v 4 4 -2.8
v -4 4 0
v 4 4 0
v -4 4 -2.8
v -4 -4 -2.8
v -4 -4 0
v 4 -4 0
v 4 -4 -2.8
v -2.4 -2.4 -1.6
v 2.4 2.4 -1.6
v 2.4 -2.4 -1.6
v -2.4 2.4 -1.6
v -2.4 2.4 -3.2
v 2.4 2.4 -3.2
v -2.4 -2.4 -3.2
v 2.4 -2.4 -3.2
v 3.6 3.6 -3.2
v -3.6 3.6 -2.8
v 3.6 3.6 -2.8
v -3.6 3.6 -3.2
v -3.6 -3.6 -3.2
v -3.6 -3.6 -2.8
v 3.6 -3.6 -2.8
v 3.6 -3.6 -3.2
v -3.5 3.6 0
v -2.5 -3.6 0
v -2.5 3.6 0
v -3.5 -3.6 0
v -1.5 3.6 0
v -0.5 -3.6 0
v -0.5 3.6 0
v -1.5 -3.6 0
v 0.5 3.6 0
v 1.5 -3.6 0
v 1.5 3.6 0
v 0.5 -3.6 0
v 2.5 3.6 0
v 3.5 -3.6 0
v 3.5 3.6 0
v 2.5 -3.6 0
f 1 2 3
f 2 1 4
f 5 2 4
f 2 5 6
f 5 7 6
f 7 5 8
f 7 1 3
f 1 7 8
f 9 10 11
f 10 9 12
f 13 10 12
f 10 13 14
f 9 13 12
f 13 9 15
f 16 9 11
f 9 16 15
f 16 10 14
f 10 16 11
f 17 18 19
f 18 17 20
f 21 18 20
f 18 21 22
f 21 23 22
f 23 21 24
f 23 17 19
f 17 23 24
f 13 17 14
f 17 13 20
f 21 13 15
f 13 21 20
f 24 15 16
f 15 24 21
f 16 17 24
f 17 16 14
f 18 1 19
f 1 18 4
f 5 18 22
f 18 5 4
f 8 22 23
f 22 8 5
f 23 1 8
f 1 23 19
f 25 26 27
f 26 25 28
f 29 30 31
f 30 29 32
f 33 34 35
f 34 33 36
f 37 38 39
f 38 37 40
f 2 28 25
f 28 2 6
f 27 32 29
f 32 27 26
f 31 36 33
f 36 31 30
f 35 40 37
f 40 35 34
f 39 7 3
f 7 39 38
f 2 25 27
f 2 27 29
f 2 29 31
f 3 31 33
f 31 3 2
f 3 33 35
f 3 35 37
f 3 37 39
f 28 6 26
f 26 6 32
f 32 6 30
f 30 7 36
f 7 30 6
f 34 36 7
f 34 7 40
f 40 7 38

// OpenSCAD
// file: ../p/4-4edge.scad
use <../lib.scad>
$fa=1; $fs=0.2;
function ldraw_lib__4_4edge(realsolid=false) = [
// 0 Circle 1.0
// 0 Name: 4-4edge.dat
// 0 Author: James Jessiman
// 0 !LDRAW_ORG Primitive UPDATE 2017-01
// 0 !LICENSE Licensed under CC BY 2.0 and CC BY 4.0 : see CAreadme.txt
// 
// 0 BFC CERTIFY CCW
  [0,"BFC","CERTIFY"],
  [0,"BFC","CCW"],
// 
// 0 !HISTORY 1998-12-15 [PTadmin] Official Update 1998-10
// 0 !HISTORY 2005-12-28 [PTadmin] Official Update 2005-01
// 0 !HISTORY 2007-06-24 [PTadmin] Header formatted for Contributor Agreement
// 0 !HISTORY 2008-07-01 [PTadmin] Official Update 2008-01
// 0 !HISTORY 2017-01-15 [Steffen] BFCed
// 0 !HISTORY 2017-12-30 [PTadmin] Official Update 2017-01
// 
// 
// 2 24 1 0 0 0.9239 0 0.3827
  [2,24,1,0,0,0.9239,0,0.3827],
// 2 24 0.9239 0 0.3827 0.7071 0 0.7071
  [2,24,0.9239,0,0.3827,0.7071,0,0.7071],
// 2 24 0.7071 0 0.7071 0.3827 0 0.9239
  [2,24,0.7071,0,0.7071,0.3827,0,0.9239],
// 2 24 0.3827 0 0.9239 0 0 1
  [2,24,0.3827,0,0.9239,0,0,1],
// 2 24 0 0 1 -0.3827 0 0.9239
  [2,24,0,0,1,-0.3827,0,0.9239],
// 2 24 -0.3827 0 0.9239 -0.7071 0 0.7071
  [2,24,-0.3827,0,0.9239,-0.7071,0,0.7071],
// 2 24 -0.7071 0 0.7071 -0.9239 0 0.3827
  [2,24,-0.7071,0,0.7071,-0.9239,0,0.3827],
// 2 24 -0.9239 0 0.3827 -1 0 -0
  [2,24,-0.9239,0,0.3827,-1,0,-0],
// 2 24 -1 0 -0 -0.9239 0 -0.3827
  [2,24,-1,0,-0,-0.9239,0,-0.3827],
// 2 24 -0.9239 0 -0.3827 -0.7071 0 -0.7071
  [2,24,-0.9239,0,-0.3827,-0.7071,0,-0.7071],
// 2 24 -0.7071 0 -0.7071 -0.3827 0 -0.9239
  [2,24,-0.7071,0,-0.7071,-0.3827,0,-0.9239],
// 2 24 -0.3827 0 -0.9239 0 0 -1
  [2,24,-0.3827,0,-0.9239,0,0,-1],
// 2 24 0 0 -1 0.3827 0 -0.9239
  [2,24,0,0,-1,0.3827,0,-0.9239],
// 2 24 0.3827 0 -0.9239 0.7071 0 -0.7071
  [2,24,0.3827,0,-0.9239,0.7071,0,-0.7071],
// 2 24 0.7071 0 -0.7071 0.9239 0 -0.3827
  [2,24,0.7071,0,-0.7071,0.9239,0,-0.3827],
// 2 24 0.9239 0 -0.3827 1 0 0
  [2,24,0.9239,0,-0.3827,1,0,0],
];
module ldraw_lib__4_4edge(step=0, col=false, unit=2/5, alt=false, line=0.2, solid=!$preview)
    makepoly(ldraw_lib__4_4edge(solid), step=step, col=col, unit=unit, alt=alt, line=line, solid=solid);
ldraw_lib__4_4edge(line=0.2);
// file: ../p/4-4disc.scad
use <../lib.scad>
$fa=1; $fs=0.2;
function ldraw_lib__4_4disc(realsolid=false) = [
// 0 Disc 1.0
// 0 Name: 4-4disc.dat
// 0 Author: James Jessiman
// 0 !LDRAW_ORG Primitive UPDATE 2002-02
// 0 !LICENSE Licensed under CC BY 2.0 and CC BY 4.0 : see CAreadme.txt
// 
// 0 BFC CERTIFY CCW
  [0,"BFC","CERTIFY"],
  [0,"BFC","CCW"],
// 
// 0 !HISTORY 1998-12-15 [PTadmin] Official Update 1998-10
// 0 !HISTORY 2002-03-23 [sbliss] Added BFC statement
// 0 !HISTORY 2002-04-25 [PTadmin] Official Update 2002-02
// 0 !HISTORY 2007-06-24 [PTadmin] Header formatted for Contributor Agreement
// 0 !HISTORY 2008-07-01 [PTadmin] Official Update 2008-01
// 
// 
// 3 16 0 0 0 1 0 0 0.9239 0 0.3827
  [3,16,0,0,0,1,0,0,0.9239,0,0.3827],
// 3 16 0 0 0 0.9239 0 0.3827 0.7071 0 0.7071
  [3,16,0,0,0,0.9239,0,0.3827,0.7071,0,0.7071],
// 3 16 0 0 0 0.7071 0 0.7071 0.3827 0 0.9239
  [3,16,0,0,0,0.7071,0,0.7071,0.3827,0,0.9239],
// 3 16 0 0 0 0.3827 0 0.9239 0 0 1
  [3,16,0,0,0,0.3827,0,0.9239,0,0,1],
// 3 16 0 0 0 0 0 1 -0.3827 0 0.9239
  [3,16,0,0,0,0,0,1,-0.3827,0,0.9239],
// 3 16 0 0 0 -0.3827 0 0.9239 -0.7071 0 0.7071
  [3,16,0,0,0,-0.3827,0,0.9239,-0.7071,0,0.7071],
// 3 16 0 0 0 -0.7071 0 0.7071 -0.9239 0 0.3827
  [3,16,0,0,0,-0.7071,0,0.7071,-0.9239,0,0.3827],
// 3 16 0 0 0 -0.9239 0 0.3827 -1 0 -0
  [3,16,0,0,0,-0.9239,0,0.3827,-1,0,-0],
// 3 16 0 0 0 -1 0 -0 -0.9239 0 -0.3827
  [3,16,0,0,0,-1,0,-0,-0.9239,0,-0.3827],
// 3 16 0 0 0 -0.9239 0 -0.3827 -0.7071 0 -0.7071
  [3,16,0,0,0,-0.9239,0,-0.3827,-0.7071,0,-0.7071],
// 3 16 0 0 0 -0.7071 0 -0.7071 -0.3827 0 -0.9239
  [3,16,0,0,0,-0.7071,0,-0.7071,-0.3827,0,-0.9239],
// 3 16 0 0 0 -0.3827 0 -0.9239 0 0 -1
  [3,16,0,0,0,-0.3827,0,-0.9239,0,0,-1],
// 3 16 0 0 0 0 0 -1 0.3827 0 -0.9239
  [3,16,0,0,0,0,0,-1,0.3827,0,-0.9239],
// 3 16 0 0 0 0.3827 0 -0.9239 0.7071 0 -0.7071
  [3,16,0,0,0,0.3827,0,-0.9239,0.7071,0,-0.7071],
// 3 16 0 0 0 0.7071 0 -0.7071 0.9239 0 -0.3827
  [3,16,0,0,0,0.7071,0,-0.7071,0.9239,0,-0.3827],
// 3 16 0 0 0 0.9239 0 -0.3827 1 0 0
  [3,16,0,0,0,0.9239,0,-0.3827,1,0,0],
// 0
];
module ldraw_lib__4_4disc(step=0, col=false, unit=2/5, alt=false, line=0.2, solid=!$preview)
    makepoly(ldraw_lib__4_4disc(solid), step=step, col=col, unit=unit, alt=alt, line=line, solid=solid);
ldraw_lib__4_4disc(line=0.2);
// file: ../p/4-4cyli.scad
use <../lib.scad>
$fa=1; $fs=0.2;
function ldraw_lib__4_4cyli(realsolid=false) = [
// 0 Cylinder 1.0
// 0 Name: 4-4cyli.dat
// 0 Author: James Jessiman
// 0 !LDRAW_ORG Primitive UPDATE 2005-01
// 0 !LICENSE Licensed under CC BY 2.0 and CC BY 4.0 : see CAreadme.txt
// 
// 0 BFC CERTIFY CCW
  [0,"BFC","CERTIFY"],
  [0,"BFC","CCW"],
// 
// 0 !HISTORY 1998-12-15 [PTadmin] Official Update 1998-10
// 0 !HISTORY 2002-03-23 [sbliss] Added BFC statement; merged headers from files in distributions LDraw 0.27 and Complete.
// 0 !HISTORY 2002-04-25 [PTadmin] Official Update 2002-02
// 0 !HISTORY 2004-12-14 [guyvivan] BFC CCW
// 0 !HISTORY 2005-12-28 [PTadmin] Official Update 2005-01
// 0 !HISTORY 2007-06-24 [PTadmin] Header formatted for Contributor Agreement
// 0 !HISTORY 2008-07-01 [PTadmin] Official Update 2008-01
// 
// 
// 4 16 1 1 0 0.9239 1 0.3827 0.9239 0 0.3827 1 0 0
  [4,16,1,1,0,0.9239,1,0.3827,0.9239,0,0.3827,1,0,0],
// 5 24 1 0 0 1 1 0 0.9239 0 0.3827 0.9239 0 -0.3827
  [5,24,1,0,0,1,1,0,0.9239,0,0.3827,0.9239,0,-0.3827],
// 4 16 0.9239 1 0.3827 0.7071 1 0.7071 0.7071 0 0.7071 0.9239 0 0.3827
  [4,16,0.9239,1,0.3827,0.7071,1,0.7071,0.7071,0,0.7071,0.9239,0,0.3827],
// 5 24 0.9239 0 0.3827 0.9239 1 0.3827 0.7071 0 0.7071 1 0 0
  [5,24,0.9239,0,0.3827,0.9239,1,0.3827,0.7071,0,0.7071,1,0,0],
// 4 16 0.7071 1 0.7071 0.3827 1 0.9239 0.3827 0 0.9239 0.7071 0 0.7071
  [4,16,0.7071,1,0.7071,0.3827,1,0.9239,0.3827,0,0.9239,0.7071,0,0.7071],
// 5 24 0.7071 0 0.7071 0.7071 1 0.7071 0.3827 0 0.9239 0.9239 0 0.3827
  [5,24,0.7071,0,0.7071,0.7071,1,0.7071,0.3827,0,0.9239,0.9239,0,0.3827],
// 4 16 0.3827 1 0.9239 0 1 1 0 0 1 0.3827 0 0.9239
  [4,16,0.3827,1,0.9239,0,1,1,0,0,1,0.3827,0,0.9239],
// 5 24 0.3827 0 0.9239 0.3827 1 0.9239 0 0 1 0.7071 0 0.7071
  [5,24,0.3827,0,0.9239,0.3827,1,0.9239,0,0,1,0.7071,0,0.7071],
// 4 16 0 1 1 -0.3827 1 0.9239 -0.3827 0 0.9239 0 0 1
  [4,16,0,1,1,-0.3827,1,0.9239,-0.3827,0,0.9239,0,0,1],
// 5 24 0 0 1 0 1 1 -0.3827 0 0.9239 0.3827 0 0.9239
  [5,24,0,0,1,0,1,1,-0.3827,0,0.9239,0.3827,0,0.9239],
// 4 16 -0.3827 1 0.9239 -0.7071 1 0.7071 -0.7071 0 0.7071 -0.3827 0 0.9239
  [4,16,-0.3827,1,0.9239,-0.7071,1,0.7071,-0.7071,0,0.7071,-0.3827,0,0.9239],
// 5 24 -0.3827 0 0.9239 -0.3827 1 0.9239 -0.7071 0 0.7071 0 0 1
  [5,24,-0.3827,0,0.9239,-0.3827,1,0.9239,-0.7071,0,0.7071,0,0,1],
// 4 16 -0.7071 1 0.7071 -0.9239 1 0.3827 -0.9239 0 0.3827 -0.7071 0 0.7071
  [4,16,-0.7071,1,0.7071,-0.9239,1,0.3827,-0.9239,0,0.3827,-0.7071,0,0.7071],
// 5 24 -0.7071 0 0.7071 -0.7071 1 0.7071 -0.9239 0 0.3827 -0.3827 0 0.9239
  [5,24,-0.7071,0,0.7071,-0.7071,1,0.7071,-0.9239,0,0.3827,-0.3827,0,0.9239],
// 4 16 -0.9239 1 0.3827 -1 1 0 -1 0 0 -0.9239 0 0.3827
  [4,16,-0.9239,1,0.3827,-1,1,0,-1,0,0,-0.9239,0,0.3827],
// 5 24 -0.9239 0 0.3827 -0.9239 1 0.3827 -1 0 0 -0.7071 0 0.7071
  [5,24,-0.9239,0,0.3827,-0.9239,1,0.3827,-1,0,0,-0.7071,0,0.7071],
// 4 16 -1 1 0 -0.9239 1 -0.3827 -0.9239 0 -0.3827 -1 0 0
  [4,16,-1,1,0,-0.9239,1,-0.3827,-0.9239,0,-0.3827,-1,0,0],
// 5 24 -1 0 0 -1 1 0 -0.9239 0 -0.3827 -0.9239 0 0.3827
  [5,24,-1,0,0,-1,1,0,-0.9239,0,-0.3827,-0.9239,0,0.3827],
// 4 16 -0.9239 1 -0.3827 -0.7071 1 -0.7071 -0.7071 0 -0.7071 -0.9239 0 -0.3827
  [4,16,-0.9239,1,-0.3827,-0.7071,1,-0.7071,-0.7071,0,-0.7071,-0.9239,0,-0.3827],
// 5 24 -0.9239 0 -0.3827 -0.9239 1 -0.3827 -0.7071 0 -0.7071 -1 0 0
  [5,24,-0.9239,0,-0.3827,-0.9239,1,-0.3827,-0.7071,0,-0.7071,-1,0,0],
// 4 16 -0.7071 1 -0.7071 -0.3827 1 -0.9239 -0.3827 0 -0.9239 -0.7071 0 -0.7071
  [4,16,-0.7071,1,-0.7071,-0.3827,1,-0.9239,-0.3827,0,-0.9239,-0.7071,0,-0.7071],
// 5 24 -0.7071 0 -0.7071 -0.7071 1 -0.7071 -0.3827 0 -0.9239 -0.9239 0 -0.3827
  [5,24,-0.7071,0,-0.7071,-0.7071,1,-0.7071,-0.3827,0,-0.9239,-0.9239,0,-0.3827],
// 4 16 -0.3827 1 -0.9239 0 1 -1 0 0 -1 -0.3827 0 -0.9239
  [4,16,-0.3827,1,-0.9239,0,1,-1,0,0,-1,-0.3827,0,-0.9239],
// 5 24 -0.3827 0 -0.9239 -0.3827 1 -0.9239 0 0 -1 -0.7071 0 -0.7071
  [5,24,-0.3827,0,-0.9239,-0.3827,1,-0.9239,0,0,-1,-0.7071,0,-0.7071],
// 4 16 0 1 -1 0.3827 1 -0.9239 0.3827 0 -0.9239 0 0 -1
  [4,16,0,1,-1,0.3827,1,-0.9239,0.3827,0,-0.9239,0,0,-1],
// 5 24 0 0 -1 0 1 -1 0.3827 0 -0.9239 -0.3827 0 -0.9239
  [5,24,0,0,-1,0,1,-1,0.3827,0,-0.9239,-0.3827,0,-0.9239],
// 4 16 0.3827 1 -0.9239 0.7071 1 -0.7071 0.7071 0 -0.7071 0.3827 0 -0.9239
  [4,16,0.3827,1,-0.9239,0.7071,1,-0.7071,0.7071,0,-0.7071,0.3827,0,-0.9239],
// 5 24 0.3827 0 -0.9239 0.3827 1 -0.9239 0.7071 0 -0.7071 0 0 -1
  [5,24,0.3827,0,-0.9239,0.3827,1,-0.9239,0.7071,0,-0.7071,0,0,-1],
// 4 16 0.7071 1 -0.7071 0.9239 1 -0.3827 0.9239 0 -0.3827 0.7071 0 -0.7071
  [4,16,0.7071,1,-0.7071,0.9239,1,-0.3827,0.9239,0,-0.3827,0.7071,0,-0.7071],
// 5 24 0.7071 0 -0.7071 0.7071 1 -0.7071 0.9239 0 -0.3827 0.3827 0 -0.9239
  [5,24,0.7071,0,-0.7071,0.7071,1,-0.7071,0.9239,0,-0.3827,0.3827,0,-0.9239],
// 4 16 0.9239 1 -0.3827 1 1 0 1 0 0 0.9239 0 -0.3827
  [4,16,0.9239,1,-0.3827,1,1,0,1,0,0,0.9239,0,-0.3827],
// 5 24 0.9239 0 -0.3827 0.9239 1 -0.3827 1 0 0 0.7071 0 -0.7071
  [5,24,0.9239,0,-0.3827,0.9239,1,-0.3827,1,0,0,0.7071,0,-0.7071],
// 0
];
module ldraw_lib__4_4cyli(step=0, col=false, unit=2/5, alt=false, line=0.2, solid=!$preview)
    makepoly(ldraw_lib__4_4cyli(solid), step=step, col=col, unit=unit, alt=alt, line=line, solid=solid);
ldraw_lib__4_4cyli(line=0.2);
// file: ../p/stud3.scad
use <../lib.scad>
use <4-4cyli.scad>
use <4-4disc.scad>
use <4-4edge.scad>
$fa=1; $fs=0.2;
function ldraw_lib__stud3(realsolid=false) = realsolid ? 
    [openscad(translate([0,0,-eps()], o=cylinder(4+eps(), r=4)),2)] : [
// 0 Stud Tube Solid
// 0 Name: stud3.dat
// 0 Author: James Jessiman
// 0 !LDRAW_ORG Primitive UPDATE 2012-01
// 0 !LICENSE Licensed under CC BY 2.0 and CC BY 4.0 : see CAreadme.txt
// 
// 0 BFC CERTIFY CCW
  [0,"BFC","CERTIFY"],
  [0,"BFC","CCW"],
// 
// 0 !HISTORY 2002-04-04 [sbliss] Modified for BFC compliance
// 0 !HISTORY 2002-04-25 [PTadmin] Official Update 2002-02
// 0 !HISTORY 2007-06-24 [PTadmin] Header formatted for Contributor Agreement
// 0 !HISTORY 2008-07-01 [PTadmin] Official Update 2008-01
// 0 !HISTORY 2012-02-16 [Philo] Changed to CCW
// 0 !HISTORY 2012-03-30 [PTadmin] Official Update 2012-01
// 
// 
// 1 16 0 -4 0 4 0 0 0 1 0 0 0 4 4-4edge.dat
  [1,16,0,-4,0,4,0,0,0,1,0,0,0,4, ldraw_lib__4_4edge(realsolid)],
// 1 16 0 0 0 4 0 0 0 1 0 0 0 4 4-4edge.dat
  [1,16,0,0,0,4,0,0,0,1,0,0,0,4, ldraw_lib__4_4edge(realsolid)],
// 1 16 0 -4 0 4 0 0 0 1 0 0 0 4 4-4disc.dat
  [1,16,0,-4,0,4,0,0,0,1,0,0,0,4, ldraw_lib__4_4disc(realsolid)],
// 1 16 0 -4 0 4 0 0 0 4 0 0 0 4 4-4cyli.dat
  [1,16,0,-4,0,4,0,0,0,4,0,0,0,4, ldraw_lib__4_4cyli(realsolid)],
];
module ldraw_lib__stud3(step=0, col=false, unit=2/5, alt=false, line=0.2, solid=!$preview)
    makepoly(ldraw_lib__stud3(solid), step=step, col=col, unit=unit, alt=alt, line=line, solid=solid);
ldraw_lib__stud3(line=0.2);
// file: ../p/stud.scad
use <../lib.scad>
use <4-4cyli.scad>
use <4-4disc.scad>
use <4-4edge.scad>
$fa=1; $fs=0.2;
function ldraw_lib__stud(realsolid=false) = realsolid ? 
    [openscad(translate([0,0,-eps()], o=cylinder(4+eps(), r=6)),2)] : [
// 0 Stud
// 0 Name: stud.dat
// 0 Author: James Jessiman
// 0 !LDRAW_ORG Primitive UPDATE 2012-01
// 0 !LICENSE Licensed under CC BY 2.0 and CC BY 4.0 : see CAreadme.txt
// 
// 0 BFC CERTIFY CCW
  [0,"BFC","CERTIFY"],
  [0,"BFC","CCW"],
// 
// 0 !HISTORY 2002-04-04 [sbliss] Modified for BFC compliance
// 0 !HISTORY 2002-04-25 [PTadmin] Official Update 2002-02
// 0 !HISTORY 2007-06-24 [PTadmin] Header formatted for Contributor Agreement
// 0 !HISTORY 2008-07-01 [PTadmin] Official Update 2008-01
// 0 !HISTORY 2012-02-16 [Philo] Changed to CCW
// 0 !HISTORY 2012-03-30 [PTadmin] Official Update 2012-01
// 
// 
// 1 16 0 0 0 6 0 0 0 1 0 0 0 6 4-4edge.dat
  [1,16,0,0,0,6,0,0,0,1,0,0,0,6, ldraw_lib__4_4edge(realsolid)],
// 1 16 0 -4 0 6 0 0 0 1 0 0 0 6 4-4edge.dat
  [1,16,0,-4,0,6,0,0,0,1,0,0,0,6, ldraw_lib__4_4edge(realsolid)],
// 1 16 0 0 0 6 0 0 0 -4 0 0 0 6 4-4cyli.dat
  [1,16,0,0,0,6,0,0,0,-4,0,0,0,6, ldraw_lib__4_4cyli(realsolid)],
// 1 16 0 -4 0 6 0 0 0 1 0 0 0 6 4-4disc.dat
  [1,16,0,-4,0,6,0,0,0,1,0,0,0,6, ldraw_lib__4_4disc(realsolid)],
];
module ldraw_lib__stud(step=0, col=false, unit=2/5, alt=false, line=0.2, solid=!$preview)
    makepoly(ldraw_lib__stud(solid), step=step, col=col, unit=unit, alt=alt, line=line, solid=solid);
ldraw_lib__stud(line=0.2);
// file: ../p/box4t.scad
use <../lib.scad>
$fa=1; $fs=0.2;
function ldraw_lib__box4t(realsolid=false) = [
// 0 Box with 4 Adjacent Faces and All Edges
// 0 Name: box4t.dat
// 0 Author: Tore Eriksson [Tore_Eriksson]
// 0 !LDRAW_ORG Primitive UPDATE 2003-02
// 0 !LICENSE Licensed under CC BY 2.0 and CC BY 4.0 : see CAreadme.txt
// 
// 0 BFC CERTIFY CCW
  [0,"BFC","CERTIFY"],
  [0,"BFC","CCW"],
// 
// 0 !HISTORY 1997-09-29 [PTadmin] Official Update 1997-15
// 0 !HISTORY 2002-08-31 [izanette] Modified with WINDZ for BFC compliance
// 0 !HISTORY 2003-08-01 [PTadmin] Official Update 2003-02
// 0 !HISTORY 2007-06-24 [PTadmin] Header formatted for Contributor Agreement
// 0 !HISTORY 2008-07-01 [PTadmin] Official Update 2008-01
// 
// 
// 2 24 1 1 1 -1 1 1
  [2,24,1,1,1,-1,1,1],
// 2 24 -1 1 1 -1 1 -1
  [2,24,-1,1,1,-1,1,-1],
// 2 24 -1 1 -1 1 1 -1
  [2,24,-1,1,-1,1,1,-1],
// 2 24 1 1 -1 1 1 1
  [2,24,1,1,-1,1,1,1],
// 2 24 1 0 1 -1 0 1
  [2,24,1,0,1,-1,0,1],
// 2 24 -1 0 1 -1 0 -1
  [2,24,-1,0,1,-1,0,-1],
// 2 24 -1 0 -1 1 0 -1
  [2,24,-1,0,-1,1,0,-1],
// 2 24 1 0 -1 1 0 1
  [2,24,1,0,-1,1,0,1],
// 2 24 1 0 1 1 1 1
  [2,24,1,0,1,1,1,1],
// 2 24 -1 0 1 -1 1 1
  [2,24,-1,0,1,-1,1,1],
// 2 24 1 0 -1 1 1 -1
  [2,24,1,0,-1,1,1,-1],
// 2 24 -1 0 -1 -1 1 -1
  [2,24,-1,0,-1,-1,1,-1],
// 4 16 1 1 1 1 1 -1 -1 1 -1 -1 1 1
  [4,16,1,1,1,1,1,-1,-1,1,-1,-1,1,1],
// 4 16 1 1 1 -1 1 1 -1 0 1 1 0 1
  [4,16,1,1,1,-1,1,1,-1,0,1,1,0,1],
// 4 16 -1 1 1 -1 1 -1 -1 0 -1 -1 0 1
  [4,16,-1,1,1,-1,1,-1,-1,0,-1,-1,0,1],
// 0 4 16 -1 1 -1 -1 0 -1 1 0 -1 1 1 -1
// 4 16 1 1 -1 1 1 1 1 0 1 1 0 -1
  [4,16,1,1,-1,1,1,1,1,0,1,1,0,-1],
// 0
];
module ldraw_lib__box4t(step=0, col=false, unit=2/5, alt=false, line=0.2, solid=!$preview)
    makepoly(ldraw_lib__box4t(solid), step=step, col=col, unit=unit, alt=alt, line=line, solid=solid);
ldraw_lib__box4t(line=0.2);
// file: s/3004s01.scad
use <../../lib.scad>
use <../../p/box4t.scad>
use <../../p/box5.scad>
use <../../p/stud.scad>
use <../../p/stud3.scad>
$fa=1; $fs=0.2;
function ldraw_lib__s__3004s01(realsolid=false) = [
// 0 ~Brick  1 x  2 without Front Face
// 0 Name: s\3004s01.dat
// 0 Author: James Jessiman
// 0 !LDRAW_ORG Subpart UPDATE 2003-03
// 0 !LICENSE Licensed under CC BY 2.0 and CC BY 4.0 : see CAreadme.txt
// 
// 0 BFC CERTIFY CCW
  [0,"BFC","CERTIFY"],
  [0,"BFC","CCW"],
// 
// 0 !HISTORY 2003-09-07 [jriley] Subfiling, BFC
// 0 !HISTORY 2003-12-19 [PTadmin] Official Update 2003-03
// 0 !HISTORY 2007-08-29 [PTadmin] Header formatted for Contributor Agreement
// 0 !HISTORY 2008-07-01 [PTadmin] Official Update 2008-01
// 
// 
// 1 16 0 4 0 1 0 0 0 -5 0 0 0 1 stud3.dat
  [1,16,0,4,0,1,0,0,0,-5,0,0,0,1, ldraw_lib__stud3(realsolid)],
// 0 BFC INVERTNEXT
  [0,"BFC","INVERTNEXT"],
// 1 16 0 24 0 16 0 0 0 -20 0 0 0 6 box5.dat
  [1,16,0,24,0,16,0,0,0,-20,0,0,0,6, ldraw_lib__box5(realsolid)],
// 4 16 20 24 10 16 24 6 -16 24 6 -20 24 10
  [4,16,20,24,10,16,24,6,-16,24,6,-20,24,10],
// 4 16 -20 24 10 -16 24 6 -16 24 -6 -20 24 -10
  [4,16,-20,24,10,-16,24,6,-16,24,-6,-20,24,-10],
// 4 16 -20 24 -10 -16 24 -6 16 24 -6 20 24 -10
  [4,16,-20,24,-10,-16,24,-6,16,24,-6,20,24,-10],
// 4 16 20 24 -10 16 24 -6 16 24 6 20 24 10
  [4,16,20,24,-10,16,24,-6,16,24,6,20,24,10],
// 1 16 0 24 0 20 0 0 0 -24 0 0 0 10 box4t.dat
  [1,16,0,24,0,20,0,0,0,-24,0,0,0,10, ldraw_lib__box4t(realsolid)],
// 1 16 10 0 0 1 0 0 0 1 0 0 0 1 stud.dat
  [1,16,10,0,0,1,0,0,0,1,0,0,0,1, ldraw_lib__stud(realsolid)],
// 1 16 -10 0 0 1 0 0 0 1 0 0 0 1 stud.dat
  [1,16,-10,0,0,1,0,0,0,1,0,0,0,1, ldraw_lib__stud(realsolid)],
// 0
];
module ldraw_lib__s__3004s01(step=0, col=false, unit=2/5, alt=false, line=0.2, solid=!$preview)
    makepoly(ldraw_lib__s__3004s01(solid), step=step, col=col, unit=unit, alt=alt, line=line, solid=solid);
ldraw_lib__s__3004s01(line=0.2);
// file: ../p/box5.scad
use <../lib.scad>
$fa=1; $fs=0.2;
function ldraw_lib__box5(realsolid=false) = [
// 0 Box with 5 Faces and All Edges
// 0 Name: box5.dat
// 0 Author: James Jessiman
// 0 !LDRAW_ORG Primitive UPDATE 2012-01
// 0 !LICENSE Licensed under CC BY 2.0 and CC BY 4.0 : see CAreadme.txt
// 
// 0 BFC CERTIFY CCW
  [0,"BFC","CERTIFY"],
  [0,"BFC","CCW"],
// 
// 0 !HISTORY 2002-04-03 [sbliss] Modified for BFC compliance
// 0 !HISTORY 2002-04-25 [PTadmin] Official Update 2002-02
// 0 !HISTORY 2007-06-24 [PTadmin] Header formatted for Contributor Agreement
// 0 !HISTORY 2008-07-01 [PTadmin] Official Update 2008-01
// 0 !HISTORY 2012-02-16 [Philo] Changed to CCW
// 0 !HISTORY 2012-03-30 [PTadmin] Official Update 2012-01
// 
// 
// 2 24 1 1 1 -1 1 1
  [2,24,1,1,1,-1,1,1],
// 2 24 -1 1 1 -1 1 -1
  [2,24,-1,1,1,-1,1,-1],
// 2 24 -1 1 -1 1 1 -1
  [2,24,-1,1,-1,1,1,-1],
// 2 24 1 1 -1 1 1 1
  [2,24,1,1,-1,1,1,1],
// 2 24 1 0 1 -1 0 1
  [2,24,1,0,1,-1,0,1],
// 2 24 -1 0 1 -1 0 -1
  [2,24,-1,0,1,-1,0,-1],
// 2 24 -1 0 -1 1 0 -1
  [2,24,-1,0,-1,1,0,-1],
// 2 24 1 0 -1 1 0 1
  [2,24,1,0,-1,1,0,1],
// 2 24 1 0 1 1 1 1
  [2,24,1,0,1,1,1,1],
// 2 24 -1 0 1 -1 1 1
  [2,24,-1,0,1,-1,1,1],
// 2 24 1 0 -1 1 1 -1
  [2,24,1,0,-1,1,1,-1],
// 2 24 -1 0 -1 -1 1 -1
  [2,24,-1,0,-1,-1,1,-1],
// 4 16 -1 1 1 1 1 1 1 1 -1 -1 1 -1
  [4,16,-1,1,1,1,1,1,1,1,-1,-1,1,-1],
// 4 16 -1 1 1 -1 0 1 1 0 1 1 1 1
  [4,16,-1,1,1,-1,0,1,1,0,1,1,1,1],
// 4 16 -1 1 -1 -1 0 -1 -1 0 1 -1 1 1
  [4,16,-1,1,-1,-1,0,-1,-1,0,1,-1,1,1],
// 4 16 1 1 -1 1 0 -1 -1 0 -1 -1 1 -1
  [4,16,1,1,-1,1,0,-1,-1,0,-1,-1,1,-1],
// 4 16 1 1 1 1 0 1 1 0 -1 1 1 -1
  [4,16,1,1,1,1,0,1,1,0,-1,1,1,-1],
];
module ldraw_lib__box5(step=0, col=false, unit=2/5, alt=false, line=0.2, solid=!$preview)
    makepoly(ldraw_lib__box5(solid), step=step, col=col, unit=unit, alt=alt, line=line, solid=solid);
ldraw_lib__box5(line=0.2);
// file: ../p/box4.scad
use <../lib.scad>
$fa=1; $fs=0.2;
function ldraw_lib__box4(realsolid=false) = [
// 0 Box with 4 Faces (2 Parallel Pairs) and All Edges
// 0 Name: box4.dat
// 0 Author: James Jessiman
// 0 !LDRAW_ORG Primitive UPDATE 2012-01
// 0 !LICENSE Licensed under CC BY 2.0 and CC BY 4.0 : see CAreadme.txt
// 
// 0 BFC CERTIFY CCW
  [0,"BFC","CERTIFY"],
  [0,"BFC","CCW"],
// 
// 0 !HISTORY 2002-04-03 [sbliss] Modified for BFC compliance
// 0 !HISTORY 2002-04-25 [PTadmin] Official Update 2002-02
// 0 !HISTORY 2007-06-24 [PTadmin] Header formatted for Contributor Agreement
// 0 !HISTORY 2008-07-01 [PTadmin] Official Update 2008-01
// 0 !HISTORY 2012-02-16 [Philo] Changed to CCW
// 0 !HISTORY 2012-03-30 [PTadmin] Official Update 2012-01
// 
// 
// 2 24 1 1 1 -1 1 1
  [2,24,1,1,1,-1,1,1],
// 2 24 -1 1 1 -1 1 -1
  [2,24,-1,1,1,-1,1,-1],
// 2 24 -1 1 -1 1 1 -1
  [2,24,-1,1,-1,1,1,-1],
// 2 24 1 1 -1 1 1 1
  [2,24,1,1,-1,1,1,1],
// 2 24 1 0 1 -1 0 1
  [2,24,1,0,1,-1,0,1],
// 2 24 -1 0 1 -1 0 -1
  [2,24,-1,0,1,-1,0,-1],
// 2 24 -1 0 -1 1 0 -1
  [2,24,-1,0,-1,1,0,-1],
// 2 24 1 0 -1 1 0 1
  [2,24,1,0,-1,1,0,1],
// 2 24 1 0 1 1 1 1
  [2,24,1,0,1,1,1,1],
// 2 24 -1 0 1 -1 1 1
  [2,24,-1,0,1,-1,1,1],
// 2 24 1 0 -1 1 1 -1
  [2,24,1,0,-1,1,1,-1],
// 2 24 -1 0 -1 -1 1 -1
  [2,24,-1,0,-1,-1,1,-1],
// 4 16 -1 1 1 -1 0 1 1 0 1 1 1 1
  [4,16,-1,1,1,-1,0,1,1,0,1,1,1,1],
// 4 16 -1 1 -1 -1 0 -1 -1 0 1 -1 1 1
  [4,16,-1,1,-1,-1,0,-1,-1,0,1,-1,1,1],
// 4 16 1 1 -1 1 0 -1 -1 0 -1 -1 1 -1
  [4,16,1,1,-1,1,0,-1,-1,0,-1,-1,1,-1],
// 4 16 1 1 1 1 0 1 1 0 -1 1 1 -1
  [4,16,1,1,1,1,0,1,1,0,-1,1,1,-1],
];
module ldraw_lib__box4(step=0, col=false, unit=2/5, alt=false, line=0.2, solid=!$preview)
    makepoly(ldraw_lib__box4(solid), step=step, col=col, unit=unit, alt=alt, line=line, solid=solid);
ldraw_lib__box4(line=0.2);
// file: 3004.scad
use <../lib.scad>
use <s/3004s01.scad>
$fa=1; $fs=0.2;
function ldraw_lib__3004(realsolid=false) = [
// 0 Brick  1 x  2
// 0 Name: 3004.dat
// 0 Author: James Jessiman
// 0 !LDRAW_ORG Part UPDATE 2022-05
// 0 !LICENSE Licensed under CC BY 2.0 and CC BY 4.0 : see CAreadme.txt
// 
// 0 BFC CERTIFY CCW
  [0,"BFC","CERTIFY"],
  [0,"BFC","CCW"],
// 
// 0 !HISTORY 2001-10-26 [PTadmin] Official Update 2001-01
// 0 !HISTORY 2002-05-07 {unknown} BFC Certification
// 0 !HISTORY 2002-06-11 [PTadmin] Official Update 2002-03
// 0 !HISTORY 2007-05-07 [PTadmin] Header formatted for Contributor Agreement
// 0 !HISTORY 2008-07-01 [PTadmin] Official Update 2008-01
// 0 !HISTORY 2022-08-04 [MagFors] Using subfile
// 0 !HISTORY 2022-09-15 [PTadmin] Official Update 2022-05
// 
// 
// 1 16 0 0 0 1 0 0 0 1 0 0 0 1 s\3004s01.dat
  [1,16,0,0,0,1,0,0,0,1,0,0,0,1, ldraw_lib__s__3004s01(realsolid)],
// 4 16 -20 24 -10 20 24 -10 20 0 -10 -20 0 -10
  [4,16,-20,24,-10,20,24,-10,20,0,-10,-20,0,-10],
];
module ldraw_lib__3004(step=0, col=false, unit=2/5, alt=false, line=0.2, solid=!$preview)
    makepoly(ldraw_lib__3004(solid), step=step, col=col, unit=unit, alt=alt, line=line, solid=solid);
ldraw_lib__3004(line=0.2);
// file: s/3070bs01.scad
use <../../lib.scad>
use <../../p/box4.scad>
use <../../p/box5.scad>
$fa=1; $fs=0.2;
function ldraw_lib__s__3070bs01(realsolid=false) = [
// 0 ~Tile  1 x  1 with Groove without Top Face
// 0 Name: s\3070bs01.dat
// 0 Author: Chris Dee [cwdee]
// 0 !LDRAW_ORG Subpart UPDATE 2009-02
// 0 !LICENSE Licensed under CC BY 2.0 and CC BY 4.0 : see CAreadme.txt
// 
// 0 BFC CERTIFY CCW
  [0,"BFC","CERTIFY"],
  [0,"BFC","CCW"],
// 
// 0 !HISTORY 2009-09-03 [PTadmin] Official Update 2009-02
// 
// 
// 1 16 0 0 0 10 0 0 0 7 0 0 0 10 box4.dat
  [1,16,0,0,0,10,0,0,0,7,0,0,0,10, ldraw_lib__box4(realsolid)],
// 0 BFC INVERTNEXT
  [0,"BFC","INVERTNEXT"],
// 1 16 0 8 0 6 0 0 0 -4 0 0 0 6 box5.dat
  [1,16,0,8,0,6,0,0,0,-4,0,0,0,6, ldraw_lib__box5(realsolid)],
// 1 16 0 7 0 9 0 0 0 1 0 0 0 9 box4.dat
  [1,16,0,7,0,9,0,0,0,1,0,0,0,9, ldraw_lib__box4(realsolid)],
// 
// 4 16 9 8 9 6 8 6 -6 8 6 -9 8 9
  [4,16,9,8,9,6,8,6,-6,8,6,-9,8,9],
// 4 16 -9 8 9 -6 8 6 -6 8 -6 -9 8 -9
  [4,16,-9,8,9,-6,8,6,-6,8,-6,-9,8,-9],
// 4 16 -9 8 -9 -6 8 -6 6 8 -6 9 8 -9
  [4,16,-9,8,-9,-6,8,-6,6,8,-6,9,8,-9],
// 4 16 9 8 -9 6 8 -6 6 8 6 9 8 9
  [4,16,9,8,-9,6,8,-6,6,8,6,9,8,9],
// 
// 4 16 10 7 10 9 7 9 -9 7 9 -10 7 10
  [4,16,10,7,10,9,7,9,-9,7,9,-10,7,10],
// 4 16 -10 7 10 -9 7 9 -9 7 -9 -10 7 -10
  [4,16,-10,7,10,-9,7,9,-9,7,-9,-10,7,-10],
// 4 16 -10 7 -10 -9 7 -9 9 7 -9 10 7 -10
  [4,16,-10,7,-10,-9,7,-9,9,7,-9,10,7,-10],
// 4 16 10 7 -10 9 7 -9 9 7 9 10 7 10
  [4,16,10,7,-10,9,7,-9,9,7,9,10,7,10],
// 0
];
module ldraw_lib__s__3070bs01(step=0, col=false, unit=2/5, alt=false, line=0.2, solid=!$preview)
    makepoly(ldraw_lib__s__3070bs01(solid), step=step, col=col, unit=unit, alt=alt, line=line, solid=solid);
ldraw_lib__s__3070bs01(line=0.2);
// main file
use <../lib.scad>
use <s/3070bs01.scad>
$fa=1; $fs=0.2;
function ldraw_lib__3070bp0m(realsolid=false) = [
// 0 Tile  1 x  1 with  4 White Stripes Pattern
// 0 Name: 3070bp0m.dat
// 0 Author: Vincent Messenet [Cheenzo]
// 0 !LDRAW_ORG Part UPDATE 2020-01
// 0 !LICENSE Licensed under CC BY 2.0 and CC BY 4.0 : see CAreadme.txt
// 
// 0 BFC CERTIFY CCW
  [0,"BFC","CERTIFY"],
  [0,"BFC","CCW"],
// 
// 0 !KEYWORDS Crosswalk, Set 21051
// 
// 0 !HISTORY 2020-06-28 [PTadmin] Official Update 2020-01
// 
// 
// 1 16 0 0 0 1 0 0 0 1 0 0 0 1 s\3070bs01.dat
  [1,16,0,0,0,1,0,0,0,1,0,0,0,1, ldraw_lib__s__3070bs01(realsolid)],
// 
// 4 15 -8.75 0 9 -8.75 0 -9 -6.25 0 -9 -6.25 0 9
  [4,15,-8.75,0,9,-8.75,0,-9,-6.25,0,-9,-6.25,0,9],
// 4 15 -3.75 0 9 -3.75 0 -9 -1.25 0 -9 -1.25 0 9
  [4,15,-3.75,0,9,-3.75,0,-9,-1.25,0,-9,-1.25,0,9],
// 4 15 1.25 0 9 1.25 0 -9 3.75 0 -9 3.75 0 9
  [4,15,1.25,0,9,1.25,0,-9,3.75,0,-9,3.75,0,9],
// 4 15 6.25 0 9 6.25 0 -9 8.75 0 -9 8.75 0 9
  [4,15,6.25,0,9,6.25,0,-9,8.75,0,-9,8.75,0,9],
// 4 16 -10 0 10 -10 0 -10 -8.75 0 -9 -8.75 0 9
  [4,16,-10,0,10,-10,0,-10,-8.75,0,-9,-8.75,0,9],
// 4 16 -6.25 0 9 -6.25 0 -9 -3.75 0 -9 -3.75 0 9
  [4,16,-6.25,0,9,-6.25,0,-9,-3.75,0,-9,-3.75,0,9],
// 4 16 -1.25 0 9 -1.25 0 -9 1.25 0 -9 1.25 0 9
  [4,16,-1.25,0,9,-1.25,0,-9,1.25,0,-9,1.25,0,9],
// 4 16 3.75 0 9 3.75 0 -9 6.25 0 -9 6.25 0 9
  [4,16,3.75,0,9,3.75,0,-9,6.25,0,-9,6.25,0,9],
// 4 16 8.75 0 9 8.75 0 -9 10 0 -10 10 0 10
  [4,16,8.75,0,9,8.75,0,-9,10,0,-10,10,0,10],
// 3 16 -10 0 10 -8.75 0 9 -6.25 0 9
  [3,16,-10,0,10,-8.75,0,9,-6.25,0,9],
// 3 16 -10 0 10 -6.25 0 9 -3.75 0 9
  [3,16,-10,0,10,-6.25,0,9,-3.75,0,9],
// 3 16 -10 0 10 -3.75 0 9 -1.25 0 9
  [3,16,-10,0,10,-3.75,0,9,-1.25,0,9],
// 4 16 -10 0 10 -1.25 0 9 1.25 0 9 10 0 10
  [4,16,-10,0,10,-1.25,0,9,1.25,0,9,10,0,10],
// 3 16 10 0 10 1.25 0 9 3.75 0 9
  [3,16,10,0,10,1.25,0,9,3.75,0,9],
// 3 16 10 0 10 3.75 0 9 6.25 0 9
  [3,16,10,0,10,3.75,0,9,6.25,0,9],
// 3 16 10 0 10 6.25 0 9 8.75 0 9
  [3,16,10,0,10,6.25,0,9,8.75,0,9],
// 3 16 -8.75 0 -9 -10 0 -10 -6.25 0 -9
  [3,16,-8.75,0,-9,-10,0,-10,-6.25,0,-9],
// 3 16 -6.25 0 -9 -10 0 -10 -3.75 0 -9
  [3,16,-6.25,0,-9,-10,0,-10,-3.75,0,-9],
// 3 16 -3.75 0 -9 -10 0 -10 -1.25 0 -9
  [3,16,-3.75,0,-9,-10,0,-10,-1.25,0,-9],
// 4 16 1.25 0 -9 -1.25 0 -9 -10 0 -10 10 0 -10
  [4,16,1.25,0,-9,-1.25,0,-9,-10,0,-10,10,0,-10],
// 3 16 3.75 0 -9 1.25 0 -9 10 0 -10
  [3,16,3.75,0,-9,1.25,0,-9,10,0,-10],
// 3 16 3.75 0 -9 10 0 -10 6.25 0 -9
  [3,16,3.75,0,-9,10,0,-10,6.25,0,-9],
// 3 16 6.25 0 -9 10 0 -10 8.75 0 -9
  [3,16,6.25,0,-9,10,0,-10,8.75,0,-9],
];
module ldraw_lib__3070bp0m(step=0, col=false, unit=2/5, alt=false, line=0.2, solid=!$preview)
    makepoly(ldraw_lib__3070bp0m(solid), step=step, col=col, unit=unit, alt=alt, line=line, solid=solid);
ldraw_lib__3070bp0m(line=0.2);
